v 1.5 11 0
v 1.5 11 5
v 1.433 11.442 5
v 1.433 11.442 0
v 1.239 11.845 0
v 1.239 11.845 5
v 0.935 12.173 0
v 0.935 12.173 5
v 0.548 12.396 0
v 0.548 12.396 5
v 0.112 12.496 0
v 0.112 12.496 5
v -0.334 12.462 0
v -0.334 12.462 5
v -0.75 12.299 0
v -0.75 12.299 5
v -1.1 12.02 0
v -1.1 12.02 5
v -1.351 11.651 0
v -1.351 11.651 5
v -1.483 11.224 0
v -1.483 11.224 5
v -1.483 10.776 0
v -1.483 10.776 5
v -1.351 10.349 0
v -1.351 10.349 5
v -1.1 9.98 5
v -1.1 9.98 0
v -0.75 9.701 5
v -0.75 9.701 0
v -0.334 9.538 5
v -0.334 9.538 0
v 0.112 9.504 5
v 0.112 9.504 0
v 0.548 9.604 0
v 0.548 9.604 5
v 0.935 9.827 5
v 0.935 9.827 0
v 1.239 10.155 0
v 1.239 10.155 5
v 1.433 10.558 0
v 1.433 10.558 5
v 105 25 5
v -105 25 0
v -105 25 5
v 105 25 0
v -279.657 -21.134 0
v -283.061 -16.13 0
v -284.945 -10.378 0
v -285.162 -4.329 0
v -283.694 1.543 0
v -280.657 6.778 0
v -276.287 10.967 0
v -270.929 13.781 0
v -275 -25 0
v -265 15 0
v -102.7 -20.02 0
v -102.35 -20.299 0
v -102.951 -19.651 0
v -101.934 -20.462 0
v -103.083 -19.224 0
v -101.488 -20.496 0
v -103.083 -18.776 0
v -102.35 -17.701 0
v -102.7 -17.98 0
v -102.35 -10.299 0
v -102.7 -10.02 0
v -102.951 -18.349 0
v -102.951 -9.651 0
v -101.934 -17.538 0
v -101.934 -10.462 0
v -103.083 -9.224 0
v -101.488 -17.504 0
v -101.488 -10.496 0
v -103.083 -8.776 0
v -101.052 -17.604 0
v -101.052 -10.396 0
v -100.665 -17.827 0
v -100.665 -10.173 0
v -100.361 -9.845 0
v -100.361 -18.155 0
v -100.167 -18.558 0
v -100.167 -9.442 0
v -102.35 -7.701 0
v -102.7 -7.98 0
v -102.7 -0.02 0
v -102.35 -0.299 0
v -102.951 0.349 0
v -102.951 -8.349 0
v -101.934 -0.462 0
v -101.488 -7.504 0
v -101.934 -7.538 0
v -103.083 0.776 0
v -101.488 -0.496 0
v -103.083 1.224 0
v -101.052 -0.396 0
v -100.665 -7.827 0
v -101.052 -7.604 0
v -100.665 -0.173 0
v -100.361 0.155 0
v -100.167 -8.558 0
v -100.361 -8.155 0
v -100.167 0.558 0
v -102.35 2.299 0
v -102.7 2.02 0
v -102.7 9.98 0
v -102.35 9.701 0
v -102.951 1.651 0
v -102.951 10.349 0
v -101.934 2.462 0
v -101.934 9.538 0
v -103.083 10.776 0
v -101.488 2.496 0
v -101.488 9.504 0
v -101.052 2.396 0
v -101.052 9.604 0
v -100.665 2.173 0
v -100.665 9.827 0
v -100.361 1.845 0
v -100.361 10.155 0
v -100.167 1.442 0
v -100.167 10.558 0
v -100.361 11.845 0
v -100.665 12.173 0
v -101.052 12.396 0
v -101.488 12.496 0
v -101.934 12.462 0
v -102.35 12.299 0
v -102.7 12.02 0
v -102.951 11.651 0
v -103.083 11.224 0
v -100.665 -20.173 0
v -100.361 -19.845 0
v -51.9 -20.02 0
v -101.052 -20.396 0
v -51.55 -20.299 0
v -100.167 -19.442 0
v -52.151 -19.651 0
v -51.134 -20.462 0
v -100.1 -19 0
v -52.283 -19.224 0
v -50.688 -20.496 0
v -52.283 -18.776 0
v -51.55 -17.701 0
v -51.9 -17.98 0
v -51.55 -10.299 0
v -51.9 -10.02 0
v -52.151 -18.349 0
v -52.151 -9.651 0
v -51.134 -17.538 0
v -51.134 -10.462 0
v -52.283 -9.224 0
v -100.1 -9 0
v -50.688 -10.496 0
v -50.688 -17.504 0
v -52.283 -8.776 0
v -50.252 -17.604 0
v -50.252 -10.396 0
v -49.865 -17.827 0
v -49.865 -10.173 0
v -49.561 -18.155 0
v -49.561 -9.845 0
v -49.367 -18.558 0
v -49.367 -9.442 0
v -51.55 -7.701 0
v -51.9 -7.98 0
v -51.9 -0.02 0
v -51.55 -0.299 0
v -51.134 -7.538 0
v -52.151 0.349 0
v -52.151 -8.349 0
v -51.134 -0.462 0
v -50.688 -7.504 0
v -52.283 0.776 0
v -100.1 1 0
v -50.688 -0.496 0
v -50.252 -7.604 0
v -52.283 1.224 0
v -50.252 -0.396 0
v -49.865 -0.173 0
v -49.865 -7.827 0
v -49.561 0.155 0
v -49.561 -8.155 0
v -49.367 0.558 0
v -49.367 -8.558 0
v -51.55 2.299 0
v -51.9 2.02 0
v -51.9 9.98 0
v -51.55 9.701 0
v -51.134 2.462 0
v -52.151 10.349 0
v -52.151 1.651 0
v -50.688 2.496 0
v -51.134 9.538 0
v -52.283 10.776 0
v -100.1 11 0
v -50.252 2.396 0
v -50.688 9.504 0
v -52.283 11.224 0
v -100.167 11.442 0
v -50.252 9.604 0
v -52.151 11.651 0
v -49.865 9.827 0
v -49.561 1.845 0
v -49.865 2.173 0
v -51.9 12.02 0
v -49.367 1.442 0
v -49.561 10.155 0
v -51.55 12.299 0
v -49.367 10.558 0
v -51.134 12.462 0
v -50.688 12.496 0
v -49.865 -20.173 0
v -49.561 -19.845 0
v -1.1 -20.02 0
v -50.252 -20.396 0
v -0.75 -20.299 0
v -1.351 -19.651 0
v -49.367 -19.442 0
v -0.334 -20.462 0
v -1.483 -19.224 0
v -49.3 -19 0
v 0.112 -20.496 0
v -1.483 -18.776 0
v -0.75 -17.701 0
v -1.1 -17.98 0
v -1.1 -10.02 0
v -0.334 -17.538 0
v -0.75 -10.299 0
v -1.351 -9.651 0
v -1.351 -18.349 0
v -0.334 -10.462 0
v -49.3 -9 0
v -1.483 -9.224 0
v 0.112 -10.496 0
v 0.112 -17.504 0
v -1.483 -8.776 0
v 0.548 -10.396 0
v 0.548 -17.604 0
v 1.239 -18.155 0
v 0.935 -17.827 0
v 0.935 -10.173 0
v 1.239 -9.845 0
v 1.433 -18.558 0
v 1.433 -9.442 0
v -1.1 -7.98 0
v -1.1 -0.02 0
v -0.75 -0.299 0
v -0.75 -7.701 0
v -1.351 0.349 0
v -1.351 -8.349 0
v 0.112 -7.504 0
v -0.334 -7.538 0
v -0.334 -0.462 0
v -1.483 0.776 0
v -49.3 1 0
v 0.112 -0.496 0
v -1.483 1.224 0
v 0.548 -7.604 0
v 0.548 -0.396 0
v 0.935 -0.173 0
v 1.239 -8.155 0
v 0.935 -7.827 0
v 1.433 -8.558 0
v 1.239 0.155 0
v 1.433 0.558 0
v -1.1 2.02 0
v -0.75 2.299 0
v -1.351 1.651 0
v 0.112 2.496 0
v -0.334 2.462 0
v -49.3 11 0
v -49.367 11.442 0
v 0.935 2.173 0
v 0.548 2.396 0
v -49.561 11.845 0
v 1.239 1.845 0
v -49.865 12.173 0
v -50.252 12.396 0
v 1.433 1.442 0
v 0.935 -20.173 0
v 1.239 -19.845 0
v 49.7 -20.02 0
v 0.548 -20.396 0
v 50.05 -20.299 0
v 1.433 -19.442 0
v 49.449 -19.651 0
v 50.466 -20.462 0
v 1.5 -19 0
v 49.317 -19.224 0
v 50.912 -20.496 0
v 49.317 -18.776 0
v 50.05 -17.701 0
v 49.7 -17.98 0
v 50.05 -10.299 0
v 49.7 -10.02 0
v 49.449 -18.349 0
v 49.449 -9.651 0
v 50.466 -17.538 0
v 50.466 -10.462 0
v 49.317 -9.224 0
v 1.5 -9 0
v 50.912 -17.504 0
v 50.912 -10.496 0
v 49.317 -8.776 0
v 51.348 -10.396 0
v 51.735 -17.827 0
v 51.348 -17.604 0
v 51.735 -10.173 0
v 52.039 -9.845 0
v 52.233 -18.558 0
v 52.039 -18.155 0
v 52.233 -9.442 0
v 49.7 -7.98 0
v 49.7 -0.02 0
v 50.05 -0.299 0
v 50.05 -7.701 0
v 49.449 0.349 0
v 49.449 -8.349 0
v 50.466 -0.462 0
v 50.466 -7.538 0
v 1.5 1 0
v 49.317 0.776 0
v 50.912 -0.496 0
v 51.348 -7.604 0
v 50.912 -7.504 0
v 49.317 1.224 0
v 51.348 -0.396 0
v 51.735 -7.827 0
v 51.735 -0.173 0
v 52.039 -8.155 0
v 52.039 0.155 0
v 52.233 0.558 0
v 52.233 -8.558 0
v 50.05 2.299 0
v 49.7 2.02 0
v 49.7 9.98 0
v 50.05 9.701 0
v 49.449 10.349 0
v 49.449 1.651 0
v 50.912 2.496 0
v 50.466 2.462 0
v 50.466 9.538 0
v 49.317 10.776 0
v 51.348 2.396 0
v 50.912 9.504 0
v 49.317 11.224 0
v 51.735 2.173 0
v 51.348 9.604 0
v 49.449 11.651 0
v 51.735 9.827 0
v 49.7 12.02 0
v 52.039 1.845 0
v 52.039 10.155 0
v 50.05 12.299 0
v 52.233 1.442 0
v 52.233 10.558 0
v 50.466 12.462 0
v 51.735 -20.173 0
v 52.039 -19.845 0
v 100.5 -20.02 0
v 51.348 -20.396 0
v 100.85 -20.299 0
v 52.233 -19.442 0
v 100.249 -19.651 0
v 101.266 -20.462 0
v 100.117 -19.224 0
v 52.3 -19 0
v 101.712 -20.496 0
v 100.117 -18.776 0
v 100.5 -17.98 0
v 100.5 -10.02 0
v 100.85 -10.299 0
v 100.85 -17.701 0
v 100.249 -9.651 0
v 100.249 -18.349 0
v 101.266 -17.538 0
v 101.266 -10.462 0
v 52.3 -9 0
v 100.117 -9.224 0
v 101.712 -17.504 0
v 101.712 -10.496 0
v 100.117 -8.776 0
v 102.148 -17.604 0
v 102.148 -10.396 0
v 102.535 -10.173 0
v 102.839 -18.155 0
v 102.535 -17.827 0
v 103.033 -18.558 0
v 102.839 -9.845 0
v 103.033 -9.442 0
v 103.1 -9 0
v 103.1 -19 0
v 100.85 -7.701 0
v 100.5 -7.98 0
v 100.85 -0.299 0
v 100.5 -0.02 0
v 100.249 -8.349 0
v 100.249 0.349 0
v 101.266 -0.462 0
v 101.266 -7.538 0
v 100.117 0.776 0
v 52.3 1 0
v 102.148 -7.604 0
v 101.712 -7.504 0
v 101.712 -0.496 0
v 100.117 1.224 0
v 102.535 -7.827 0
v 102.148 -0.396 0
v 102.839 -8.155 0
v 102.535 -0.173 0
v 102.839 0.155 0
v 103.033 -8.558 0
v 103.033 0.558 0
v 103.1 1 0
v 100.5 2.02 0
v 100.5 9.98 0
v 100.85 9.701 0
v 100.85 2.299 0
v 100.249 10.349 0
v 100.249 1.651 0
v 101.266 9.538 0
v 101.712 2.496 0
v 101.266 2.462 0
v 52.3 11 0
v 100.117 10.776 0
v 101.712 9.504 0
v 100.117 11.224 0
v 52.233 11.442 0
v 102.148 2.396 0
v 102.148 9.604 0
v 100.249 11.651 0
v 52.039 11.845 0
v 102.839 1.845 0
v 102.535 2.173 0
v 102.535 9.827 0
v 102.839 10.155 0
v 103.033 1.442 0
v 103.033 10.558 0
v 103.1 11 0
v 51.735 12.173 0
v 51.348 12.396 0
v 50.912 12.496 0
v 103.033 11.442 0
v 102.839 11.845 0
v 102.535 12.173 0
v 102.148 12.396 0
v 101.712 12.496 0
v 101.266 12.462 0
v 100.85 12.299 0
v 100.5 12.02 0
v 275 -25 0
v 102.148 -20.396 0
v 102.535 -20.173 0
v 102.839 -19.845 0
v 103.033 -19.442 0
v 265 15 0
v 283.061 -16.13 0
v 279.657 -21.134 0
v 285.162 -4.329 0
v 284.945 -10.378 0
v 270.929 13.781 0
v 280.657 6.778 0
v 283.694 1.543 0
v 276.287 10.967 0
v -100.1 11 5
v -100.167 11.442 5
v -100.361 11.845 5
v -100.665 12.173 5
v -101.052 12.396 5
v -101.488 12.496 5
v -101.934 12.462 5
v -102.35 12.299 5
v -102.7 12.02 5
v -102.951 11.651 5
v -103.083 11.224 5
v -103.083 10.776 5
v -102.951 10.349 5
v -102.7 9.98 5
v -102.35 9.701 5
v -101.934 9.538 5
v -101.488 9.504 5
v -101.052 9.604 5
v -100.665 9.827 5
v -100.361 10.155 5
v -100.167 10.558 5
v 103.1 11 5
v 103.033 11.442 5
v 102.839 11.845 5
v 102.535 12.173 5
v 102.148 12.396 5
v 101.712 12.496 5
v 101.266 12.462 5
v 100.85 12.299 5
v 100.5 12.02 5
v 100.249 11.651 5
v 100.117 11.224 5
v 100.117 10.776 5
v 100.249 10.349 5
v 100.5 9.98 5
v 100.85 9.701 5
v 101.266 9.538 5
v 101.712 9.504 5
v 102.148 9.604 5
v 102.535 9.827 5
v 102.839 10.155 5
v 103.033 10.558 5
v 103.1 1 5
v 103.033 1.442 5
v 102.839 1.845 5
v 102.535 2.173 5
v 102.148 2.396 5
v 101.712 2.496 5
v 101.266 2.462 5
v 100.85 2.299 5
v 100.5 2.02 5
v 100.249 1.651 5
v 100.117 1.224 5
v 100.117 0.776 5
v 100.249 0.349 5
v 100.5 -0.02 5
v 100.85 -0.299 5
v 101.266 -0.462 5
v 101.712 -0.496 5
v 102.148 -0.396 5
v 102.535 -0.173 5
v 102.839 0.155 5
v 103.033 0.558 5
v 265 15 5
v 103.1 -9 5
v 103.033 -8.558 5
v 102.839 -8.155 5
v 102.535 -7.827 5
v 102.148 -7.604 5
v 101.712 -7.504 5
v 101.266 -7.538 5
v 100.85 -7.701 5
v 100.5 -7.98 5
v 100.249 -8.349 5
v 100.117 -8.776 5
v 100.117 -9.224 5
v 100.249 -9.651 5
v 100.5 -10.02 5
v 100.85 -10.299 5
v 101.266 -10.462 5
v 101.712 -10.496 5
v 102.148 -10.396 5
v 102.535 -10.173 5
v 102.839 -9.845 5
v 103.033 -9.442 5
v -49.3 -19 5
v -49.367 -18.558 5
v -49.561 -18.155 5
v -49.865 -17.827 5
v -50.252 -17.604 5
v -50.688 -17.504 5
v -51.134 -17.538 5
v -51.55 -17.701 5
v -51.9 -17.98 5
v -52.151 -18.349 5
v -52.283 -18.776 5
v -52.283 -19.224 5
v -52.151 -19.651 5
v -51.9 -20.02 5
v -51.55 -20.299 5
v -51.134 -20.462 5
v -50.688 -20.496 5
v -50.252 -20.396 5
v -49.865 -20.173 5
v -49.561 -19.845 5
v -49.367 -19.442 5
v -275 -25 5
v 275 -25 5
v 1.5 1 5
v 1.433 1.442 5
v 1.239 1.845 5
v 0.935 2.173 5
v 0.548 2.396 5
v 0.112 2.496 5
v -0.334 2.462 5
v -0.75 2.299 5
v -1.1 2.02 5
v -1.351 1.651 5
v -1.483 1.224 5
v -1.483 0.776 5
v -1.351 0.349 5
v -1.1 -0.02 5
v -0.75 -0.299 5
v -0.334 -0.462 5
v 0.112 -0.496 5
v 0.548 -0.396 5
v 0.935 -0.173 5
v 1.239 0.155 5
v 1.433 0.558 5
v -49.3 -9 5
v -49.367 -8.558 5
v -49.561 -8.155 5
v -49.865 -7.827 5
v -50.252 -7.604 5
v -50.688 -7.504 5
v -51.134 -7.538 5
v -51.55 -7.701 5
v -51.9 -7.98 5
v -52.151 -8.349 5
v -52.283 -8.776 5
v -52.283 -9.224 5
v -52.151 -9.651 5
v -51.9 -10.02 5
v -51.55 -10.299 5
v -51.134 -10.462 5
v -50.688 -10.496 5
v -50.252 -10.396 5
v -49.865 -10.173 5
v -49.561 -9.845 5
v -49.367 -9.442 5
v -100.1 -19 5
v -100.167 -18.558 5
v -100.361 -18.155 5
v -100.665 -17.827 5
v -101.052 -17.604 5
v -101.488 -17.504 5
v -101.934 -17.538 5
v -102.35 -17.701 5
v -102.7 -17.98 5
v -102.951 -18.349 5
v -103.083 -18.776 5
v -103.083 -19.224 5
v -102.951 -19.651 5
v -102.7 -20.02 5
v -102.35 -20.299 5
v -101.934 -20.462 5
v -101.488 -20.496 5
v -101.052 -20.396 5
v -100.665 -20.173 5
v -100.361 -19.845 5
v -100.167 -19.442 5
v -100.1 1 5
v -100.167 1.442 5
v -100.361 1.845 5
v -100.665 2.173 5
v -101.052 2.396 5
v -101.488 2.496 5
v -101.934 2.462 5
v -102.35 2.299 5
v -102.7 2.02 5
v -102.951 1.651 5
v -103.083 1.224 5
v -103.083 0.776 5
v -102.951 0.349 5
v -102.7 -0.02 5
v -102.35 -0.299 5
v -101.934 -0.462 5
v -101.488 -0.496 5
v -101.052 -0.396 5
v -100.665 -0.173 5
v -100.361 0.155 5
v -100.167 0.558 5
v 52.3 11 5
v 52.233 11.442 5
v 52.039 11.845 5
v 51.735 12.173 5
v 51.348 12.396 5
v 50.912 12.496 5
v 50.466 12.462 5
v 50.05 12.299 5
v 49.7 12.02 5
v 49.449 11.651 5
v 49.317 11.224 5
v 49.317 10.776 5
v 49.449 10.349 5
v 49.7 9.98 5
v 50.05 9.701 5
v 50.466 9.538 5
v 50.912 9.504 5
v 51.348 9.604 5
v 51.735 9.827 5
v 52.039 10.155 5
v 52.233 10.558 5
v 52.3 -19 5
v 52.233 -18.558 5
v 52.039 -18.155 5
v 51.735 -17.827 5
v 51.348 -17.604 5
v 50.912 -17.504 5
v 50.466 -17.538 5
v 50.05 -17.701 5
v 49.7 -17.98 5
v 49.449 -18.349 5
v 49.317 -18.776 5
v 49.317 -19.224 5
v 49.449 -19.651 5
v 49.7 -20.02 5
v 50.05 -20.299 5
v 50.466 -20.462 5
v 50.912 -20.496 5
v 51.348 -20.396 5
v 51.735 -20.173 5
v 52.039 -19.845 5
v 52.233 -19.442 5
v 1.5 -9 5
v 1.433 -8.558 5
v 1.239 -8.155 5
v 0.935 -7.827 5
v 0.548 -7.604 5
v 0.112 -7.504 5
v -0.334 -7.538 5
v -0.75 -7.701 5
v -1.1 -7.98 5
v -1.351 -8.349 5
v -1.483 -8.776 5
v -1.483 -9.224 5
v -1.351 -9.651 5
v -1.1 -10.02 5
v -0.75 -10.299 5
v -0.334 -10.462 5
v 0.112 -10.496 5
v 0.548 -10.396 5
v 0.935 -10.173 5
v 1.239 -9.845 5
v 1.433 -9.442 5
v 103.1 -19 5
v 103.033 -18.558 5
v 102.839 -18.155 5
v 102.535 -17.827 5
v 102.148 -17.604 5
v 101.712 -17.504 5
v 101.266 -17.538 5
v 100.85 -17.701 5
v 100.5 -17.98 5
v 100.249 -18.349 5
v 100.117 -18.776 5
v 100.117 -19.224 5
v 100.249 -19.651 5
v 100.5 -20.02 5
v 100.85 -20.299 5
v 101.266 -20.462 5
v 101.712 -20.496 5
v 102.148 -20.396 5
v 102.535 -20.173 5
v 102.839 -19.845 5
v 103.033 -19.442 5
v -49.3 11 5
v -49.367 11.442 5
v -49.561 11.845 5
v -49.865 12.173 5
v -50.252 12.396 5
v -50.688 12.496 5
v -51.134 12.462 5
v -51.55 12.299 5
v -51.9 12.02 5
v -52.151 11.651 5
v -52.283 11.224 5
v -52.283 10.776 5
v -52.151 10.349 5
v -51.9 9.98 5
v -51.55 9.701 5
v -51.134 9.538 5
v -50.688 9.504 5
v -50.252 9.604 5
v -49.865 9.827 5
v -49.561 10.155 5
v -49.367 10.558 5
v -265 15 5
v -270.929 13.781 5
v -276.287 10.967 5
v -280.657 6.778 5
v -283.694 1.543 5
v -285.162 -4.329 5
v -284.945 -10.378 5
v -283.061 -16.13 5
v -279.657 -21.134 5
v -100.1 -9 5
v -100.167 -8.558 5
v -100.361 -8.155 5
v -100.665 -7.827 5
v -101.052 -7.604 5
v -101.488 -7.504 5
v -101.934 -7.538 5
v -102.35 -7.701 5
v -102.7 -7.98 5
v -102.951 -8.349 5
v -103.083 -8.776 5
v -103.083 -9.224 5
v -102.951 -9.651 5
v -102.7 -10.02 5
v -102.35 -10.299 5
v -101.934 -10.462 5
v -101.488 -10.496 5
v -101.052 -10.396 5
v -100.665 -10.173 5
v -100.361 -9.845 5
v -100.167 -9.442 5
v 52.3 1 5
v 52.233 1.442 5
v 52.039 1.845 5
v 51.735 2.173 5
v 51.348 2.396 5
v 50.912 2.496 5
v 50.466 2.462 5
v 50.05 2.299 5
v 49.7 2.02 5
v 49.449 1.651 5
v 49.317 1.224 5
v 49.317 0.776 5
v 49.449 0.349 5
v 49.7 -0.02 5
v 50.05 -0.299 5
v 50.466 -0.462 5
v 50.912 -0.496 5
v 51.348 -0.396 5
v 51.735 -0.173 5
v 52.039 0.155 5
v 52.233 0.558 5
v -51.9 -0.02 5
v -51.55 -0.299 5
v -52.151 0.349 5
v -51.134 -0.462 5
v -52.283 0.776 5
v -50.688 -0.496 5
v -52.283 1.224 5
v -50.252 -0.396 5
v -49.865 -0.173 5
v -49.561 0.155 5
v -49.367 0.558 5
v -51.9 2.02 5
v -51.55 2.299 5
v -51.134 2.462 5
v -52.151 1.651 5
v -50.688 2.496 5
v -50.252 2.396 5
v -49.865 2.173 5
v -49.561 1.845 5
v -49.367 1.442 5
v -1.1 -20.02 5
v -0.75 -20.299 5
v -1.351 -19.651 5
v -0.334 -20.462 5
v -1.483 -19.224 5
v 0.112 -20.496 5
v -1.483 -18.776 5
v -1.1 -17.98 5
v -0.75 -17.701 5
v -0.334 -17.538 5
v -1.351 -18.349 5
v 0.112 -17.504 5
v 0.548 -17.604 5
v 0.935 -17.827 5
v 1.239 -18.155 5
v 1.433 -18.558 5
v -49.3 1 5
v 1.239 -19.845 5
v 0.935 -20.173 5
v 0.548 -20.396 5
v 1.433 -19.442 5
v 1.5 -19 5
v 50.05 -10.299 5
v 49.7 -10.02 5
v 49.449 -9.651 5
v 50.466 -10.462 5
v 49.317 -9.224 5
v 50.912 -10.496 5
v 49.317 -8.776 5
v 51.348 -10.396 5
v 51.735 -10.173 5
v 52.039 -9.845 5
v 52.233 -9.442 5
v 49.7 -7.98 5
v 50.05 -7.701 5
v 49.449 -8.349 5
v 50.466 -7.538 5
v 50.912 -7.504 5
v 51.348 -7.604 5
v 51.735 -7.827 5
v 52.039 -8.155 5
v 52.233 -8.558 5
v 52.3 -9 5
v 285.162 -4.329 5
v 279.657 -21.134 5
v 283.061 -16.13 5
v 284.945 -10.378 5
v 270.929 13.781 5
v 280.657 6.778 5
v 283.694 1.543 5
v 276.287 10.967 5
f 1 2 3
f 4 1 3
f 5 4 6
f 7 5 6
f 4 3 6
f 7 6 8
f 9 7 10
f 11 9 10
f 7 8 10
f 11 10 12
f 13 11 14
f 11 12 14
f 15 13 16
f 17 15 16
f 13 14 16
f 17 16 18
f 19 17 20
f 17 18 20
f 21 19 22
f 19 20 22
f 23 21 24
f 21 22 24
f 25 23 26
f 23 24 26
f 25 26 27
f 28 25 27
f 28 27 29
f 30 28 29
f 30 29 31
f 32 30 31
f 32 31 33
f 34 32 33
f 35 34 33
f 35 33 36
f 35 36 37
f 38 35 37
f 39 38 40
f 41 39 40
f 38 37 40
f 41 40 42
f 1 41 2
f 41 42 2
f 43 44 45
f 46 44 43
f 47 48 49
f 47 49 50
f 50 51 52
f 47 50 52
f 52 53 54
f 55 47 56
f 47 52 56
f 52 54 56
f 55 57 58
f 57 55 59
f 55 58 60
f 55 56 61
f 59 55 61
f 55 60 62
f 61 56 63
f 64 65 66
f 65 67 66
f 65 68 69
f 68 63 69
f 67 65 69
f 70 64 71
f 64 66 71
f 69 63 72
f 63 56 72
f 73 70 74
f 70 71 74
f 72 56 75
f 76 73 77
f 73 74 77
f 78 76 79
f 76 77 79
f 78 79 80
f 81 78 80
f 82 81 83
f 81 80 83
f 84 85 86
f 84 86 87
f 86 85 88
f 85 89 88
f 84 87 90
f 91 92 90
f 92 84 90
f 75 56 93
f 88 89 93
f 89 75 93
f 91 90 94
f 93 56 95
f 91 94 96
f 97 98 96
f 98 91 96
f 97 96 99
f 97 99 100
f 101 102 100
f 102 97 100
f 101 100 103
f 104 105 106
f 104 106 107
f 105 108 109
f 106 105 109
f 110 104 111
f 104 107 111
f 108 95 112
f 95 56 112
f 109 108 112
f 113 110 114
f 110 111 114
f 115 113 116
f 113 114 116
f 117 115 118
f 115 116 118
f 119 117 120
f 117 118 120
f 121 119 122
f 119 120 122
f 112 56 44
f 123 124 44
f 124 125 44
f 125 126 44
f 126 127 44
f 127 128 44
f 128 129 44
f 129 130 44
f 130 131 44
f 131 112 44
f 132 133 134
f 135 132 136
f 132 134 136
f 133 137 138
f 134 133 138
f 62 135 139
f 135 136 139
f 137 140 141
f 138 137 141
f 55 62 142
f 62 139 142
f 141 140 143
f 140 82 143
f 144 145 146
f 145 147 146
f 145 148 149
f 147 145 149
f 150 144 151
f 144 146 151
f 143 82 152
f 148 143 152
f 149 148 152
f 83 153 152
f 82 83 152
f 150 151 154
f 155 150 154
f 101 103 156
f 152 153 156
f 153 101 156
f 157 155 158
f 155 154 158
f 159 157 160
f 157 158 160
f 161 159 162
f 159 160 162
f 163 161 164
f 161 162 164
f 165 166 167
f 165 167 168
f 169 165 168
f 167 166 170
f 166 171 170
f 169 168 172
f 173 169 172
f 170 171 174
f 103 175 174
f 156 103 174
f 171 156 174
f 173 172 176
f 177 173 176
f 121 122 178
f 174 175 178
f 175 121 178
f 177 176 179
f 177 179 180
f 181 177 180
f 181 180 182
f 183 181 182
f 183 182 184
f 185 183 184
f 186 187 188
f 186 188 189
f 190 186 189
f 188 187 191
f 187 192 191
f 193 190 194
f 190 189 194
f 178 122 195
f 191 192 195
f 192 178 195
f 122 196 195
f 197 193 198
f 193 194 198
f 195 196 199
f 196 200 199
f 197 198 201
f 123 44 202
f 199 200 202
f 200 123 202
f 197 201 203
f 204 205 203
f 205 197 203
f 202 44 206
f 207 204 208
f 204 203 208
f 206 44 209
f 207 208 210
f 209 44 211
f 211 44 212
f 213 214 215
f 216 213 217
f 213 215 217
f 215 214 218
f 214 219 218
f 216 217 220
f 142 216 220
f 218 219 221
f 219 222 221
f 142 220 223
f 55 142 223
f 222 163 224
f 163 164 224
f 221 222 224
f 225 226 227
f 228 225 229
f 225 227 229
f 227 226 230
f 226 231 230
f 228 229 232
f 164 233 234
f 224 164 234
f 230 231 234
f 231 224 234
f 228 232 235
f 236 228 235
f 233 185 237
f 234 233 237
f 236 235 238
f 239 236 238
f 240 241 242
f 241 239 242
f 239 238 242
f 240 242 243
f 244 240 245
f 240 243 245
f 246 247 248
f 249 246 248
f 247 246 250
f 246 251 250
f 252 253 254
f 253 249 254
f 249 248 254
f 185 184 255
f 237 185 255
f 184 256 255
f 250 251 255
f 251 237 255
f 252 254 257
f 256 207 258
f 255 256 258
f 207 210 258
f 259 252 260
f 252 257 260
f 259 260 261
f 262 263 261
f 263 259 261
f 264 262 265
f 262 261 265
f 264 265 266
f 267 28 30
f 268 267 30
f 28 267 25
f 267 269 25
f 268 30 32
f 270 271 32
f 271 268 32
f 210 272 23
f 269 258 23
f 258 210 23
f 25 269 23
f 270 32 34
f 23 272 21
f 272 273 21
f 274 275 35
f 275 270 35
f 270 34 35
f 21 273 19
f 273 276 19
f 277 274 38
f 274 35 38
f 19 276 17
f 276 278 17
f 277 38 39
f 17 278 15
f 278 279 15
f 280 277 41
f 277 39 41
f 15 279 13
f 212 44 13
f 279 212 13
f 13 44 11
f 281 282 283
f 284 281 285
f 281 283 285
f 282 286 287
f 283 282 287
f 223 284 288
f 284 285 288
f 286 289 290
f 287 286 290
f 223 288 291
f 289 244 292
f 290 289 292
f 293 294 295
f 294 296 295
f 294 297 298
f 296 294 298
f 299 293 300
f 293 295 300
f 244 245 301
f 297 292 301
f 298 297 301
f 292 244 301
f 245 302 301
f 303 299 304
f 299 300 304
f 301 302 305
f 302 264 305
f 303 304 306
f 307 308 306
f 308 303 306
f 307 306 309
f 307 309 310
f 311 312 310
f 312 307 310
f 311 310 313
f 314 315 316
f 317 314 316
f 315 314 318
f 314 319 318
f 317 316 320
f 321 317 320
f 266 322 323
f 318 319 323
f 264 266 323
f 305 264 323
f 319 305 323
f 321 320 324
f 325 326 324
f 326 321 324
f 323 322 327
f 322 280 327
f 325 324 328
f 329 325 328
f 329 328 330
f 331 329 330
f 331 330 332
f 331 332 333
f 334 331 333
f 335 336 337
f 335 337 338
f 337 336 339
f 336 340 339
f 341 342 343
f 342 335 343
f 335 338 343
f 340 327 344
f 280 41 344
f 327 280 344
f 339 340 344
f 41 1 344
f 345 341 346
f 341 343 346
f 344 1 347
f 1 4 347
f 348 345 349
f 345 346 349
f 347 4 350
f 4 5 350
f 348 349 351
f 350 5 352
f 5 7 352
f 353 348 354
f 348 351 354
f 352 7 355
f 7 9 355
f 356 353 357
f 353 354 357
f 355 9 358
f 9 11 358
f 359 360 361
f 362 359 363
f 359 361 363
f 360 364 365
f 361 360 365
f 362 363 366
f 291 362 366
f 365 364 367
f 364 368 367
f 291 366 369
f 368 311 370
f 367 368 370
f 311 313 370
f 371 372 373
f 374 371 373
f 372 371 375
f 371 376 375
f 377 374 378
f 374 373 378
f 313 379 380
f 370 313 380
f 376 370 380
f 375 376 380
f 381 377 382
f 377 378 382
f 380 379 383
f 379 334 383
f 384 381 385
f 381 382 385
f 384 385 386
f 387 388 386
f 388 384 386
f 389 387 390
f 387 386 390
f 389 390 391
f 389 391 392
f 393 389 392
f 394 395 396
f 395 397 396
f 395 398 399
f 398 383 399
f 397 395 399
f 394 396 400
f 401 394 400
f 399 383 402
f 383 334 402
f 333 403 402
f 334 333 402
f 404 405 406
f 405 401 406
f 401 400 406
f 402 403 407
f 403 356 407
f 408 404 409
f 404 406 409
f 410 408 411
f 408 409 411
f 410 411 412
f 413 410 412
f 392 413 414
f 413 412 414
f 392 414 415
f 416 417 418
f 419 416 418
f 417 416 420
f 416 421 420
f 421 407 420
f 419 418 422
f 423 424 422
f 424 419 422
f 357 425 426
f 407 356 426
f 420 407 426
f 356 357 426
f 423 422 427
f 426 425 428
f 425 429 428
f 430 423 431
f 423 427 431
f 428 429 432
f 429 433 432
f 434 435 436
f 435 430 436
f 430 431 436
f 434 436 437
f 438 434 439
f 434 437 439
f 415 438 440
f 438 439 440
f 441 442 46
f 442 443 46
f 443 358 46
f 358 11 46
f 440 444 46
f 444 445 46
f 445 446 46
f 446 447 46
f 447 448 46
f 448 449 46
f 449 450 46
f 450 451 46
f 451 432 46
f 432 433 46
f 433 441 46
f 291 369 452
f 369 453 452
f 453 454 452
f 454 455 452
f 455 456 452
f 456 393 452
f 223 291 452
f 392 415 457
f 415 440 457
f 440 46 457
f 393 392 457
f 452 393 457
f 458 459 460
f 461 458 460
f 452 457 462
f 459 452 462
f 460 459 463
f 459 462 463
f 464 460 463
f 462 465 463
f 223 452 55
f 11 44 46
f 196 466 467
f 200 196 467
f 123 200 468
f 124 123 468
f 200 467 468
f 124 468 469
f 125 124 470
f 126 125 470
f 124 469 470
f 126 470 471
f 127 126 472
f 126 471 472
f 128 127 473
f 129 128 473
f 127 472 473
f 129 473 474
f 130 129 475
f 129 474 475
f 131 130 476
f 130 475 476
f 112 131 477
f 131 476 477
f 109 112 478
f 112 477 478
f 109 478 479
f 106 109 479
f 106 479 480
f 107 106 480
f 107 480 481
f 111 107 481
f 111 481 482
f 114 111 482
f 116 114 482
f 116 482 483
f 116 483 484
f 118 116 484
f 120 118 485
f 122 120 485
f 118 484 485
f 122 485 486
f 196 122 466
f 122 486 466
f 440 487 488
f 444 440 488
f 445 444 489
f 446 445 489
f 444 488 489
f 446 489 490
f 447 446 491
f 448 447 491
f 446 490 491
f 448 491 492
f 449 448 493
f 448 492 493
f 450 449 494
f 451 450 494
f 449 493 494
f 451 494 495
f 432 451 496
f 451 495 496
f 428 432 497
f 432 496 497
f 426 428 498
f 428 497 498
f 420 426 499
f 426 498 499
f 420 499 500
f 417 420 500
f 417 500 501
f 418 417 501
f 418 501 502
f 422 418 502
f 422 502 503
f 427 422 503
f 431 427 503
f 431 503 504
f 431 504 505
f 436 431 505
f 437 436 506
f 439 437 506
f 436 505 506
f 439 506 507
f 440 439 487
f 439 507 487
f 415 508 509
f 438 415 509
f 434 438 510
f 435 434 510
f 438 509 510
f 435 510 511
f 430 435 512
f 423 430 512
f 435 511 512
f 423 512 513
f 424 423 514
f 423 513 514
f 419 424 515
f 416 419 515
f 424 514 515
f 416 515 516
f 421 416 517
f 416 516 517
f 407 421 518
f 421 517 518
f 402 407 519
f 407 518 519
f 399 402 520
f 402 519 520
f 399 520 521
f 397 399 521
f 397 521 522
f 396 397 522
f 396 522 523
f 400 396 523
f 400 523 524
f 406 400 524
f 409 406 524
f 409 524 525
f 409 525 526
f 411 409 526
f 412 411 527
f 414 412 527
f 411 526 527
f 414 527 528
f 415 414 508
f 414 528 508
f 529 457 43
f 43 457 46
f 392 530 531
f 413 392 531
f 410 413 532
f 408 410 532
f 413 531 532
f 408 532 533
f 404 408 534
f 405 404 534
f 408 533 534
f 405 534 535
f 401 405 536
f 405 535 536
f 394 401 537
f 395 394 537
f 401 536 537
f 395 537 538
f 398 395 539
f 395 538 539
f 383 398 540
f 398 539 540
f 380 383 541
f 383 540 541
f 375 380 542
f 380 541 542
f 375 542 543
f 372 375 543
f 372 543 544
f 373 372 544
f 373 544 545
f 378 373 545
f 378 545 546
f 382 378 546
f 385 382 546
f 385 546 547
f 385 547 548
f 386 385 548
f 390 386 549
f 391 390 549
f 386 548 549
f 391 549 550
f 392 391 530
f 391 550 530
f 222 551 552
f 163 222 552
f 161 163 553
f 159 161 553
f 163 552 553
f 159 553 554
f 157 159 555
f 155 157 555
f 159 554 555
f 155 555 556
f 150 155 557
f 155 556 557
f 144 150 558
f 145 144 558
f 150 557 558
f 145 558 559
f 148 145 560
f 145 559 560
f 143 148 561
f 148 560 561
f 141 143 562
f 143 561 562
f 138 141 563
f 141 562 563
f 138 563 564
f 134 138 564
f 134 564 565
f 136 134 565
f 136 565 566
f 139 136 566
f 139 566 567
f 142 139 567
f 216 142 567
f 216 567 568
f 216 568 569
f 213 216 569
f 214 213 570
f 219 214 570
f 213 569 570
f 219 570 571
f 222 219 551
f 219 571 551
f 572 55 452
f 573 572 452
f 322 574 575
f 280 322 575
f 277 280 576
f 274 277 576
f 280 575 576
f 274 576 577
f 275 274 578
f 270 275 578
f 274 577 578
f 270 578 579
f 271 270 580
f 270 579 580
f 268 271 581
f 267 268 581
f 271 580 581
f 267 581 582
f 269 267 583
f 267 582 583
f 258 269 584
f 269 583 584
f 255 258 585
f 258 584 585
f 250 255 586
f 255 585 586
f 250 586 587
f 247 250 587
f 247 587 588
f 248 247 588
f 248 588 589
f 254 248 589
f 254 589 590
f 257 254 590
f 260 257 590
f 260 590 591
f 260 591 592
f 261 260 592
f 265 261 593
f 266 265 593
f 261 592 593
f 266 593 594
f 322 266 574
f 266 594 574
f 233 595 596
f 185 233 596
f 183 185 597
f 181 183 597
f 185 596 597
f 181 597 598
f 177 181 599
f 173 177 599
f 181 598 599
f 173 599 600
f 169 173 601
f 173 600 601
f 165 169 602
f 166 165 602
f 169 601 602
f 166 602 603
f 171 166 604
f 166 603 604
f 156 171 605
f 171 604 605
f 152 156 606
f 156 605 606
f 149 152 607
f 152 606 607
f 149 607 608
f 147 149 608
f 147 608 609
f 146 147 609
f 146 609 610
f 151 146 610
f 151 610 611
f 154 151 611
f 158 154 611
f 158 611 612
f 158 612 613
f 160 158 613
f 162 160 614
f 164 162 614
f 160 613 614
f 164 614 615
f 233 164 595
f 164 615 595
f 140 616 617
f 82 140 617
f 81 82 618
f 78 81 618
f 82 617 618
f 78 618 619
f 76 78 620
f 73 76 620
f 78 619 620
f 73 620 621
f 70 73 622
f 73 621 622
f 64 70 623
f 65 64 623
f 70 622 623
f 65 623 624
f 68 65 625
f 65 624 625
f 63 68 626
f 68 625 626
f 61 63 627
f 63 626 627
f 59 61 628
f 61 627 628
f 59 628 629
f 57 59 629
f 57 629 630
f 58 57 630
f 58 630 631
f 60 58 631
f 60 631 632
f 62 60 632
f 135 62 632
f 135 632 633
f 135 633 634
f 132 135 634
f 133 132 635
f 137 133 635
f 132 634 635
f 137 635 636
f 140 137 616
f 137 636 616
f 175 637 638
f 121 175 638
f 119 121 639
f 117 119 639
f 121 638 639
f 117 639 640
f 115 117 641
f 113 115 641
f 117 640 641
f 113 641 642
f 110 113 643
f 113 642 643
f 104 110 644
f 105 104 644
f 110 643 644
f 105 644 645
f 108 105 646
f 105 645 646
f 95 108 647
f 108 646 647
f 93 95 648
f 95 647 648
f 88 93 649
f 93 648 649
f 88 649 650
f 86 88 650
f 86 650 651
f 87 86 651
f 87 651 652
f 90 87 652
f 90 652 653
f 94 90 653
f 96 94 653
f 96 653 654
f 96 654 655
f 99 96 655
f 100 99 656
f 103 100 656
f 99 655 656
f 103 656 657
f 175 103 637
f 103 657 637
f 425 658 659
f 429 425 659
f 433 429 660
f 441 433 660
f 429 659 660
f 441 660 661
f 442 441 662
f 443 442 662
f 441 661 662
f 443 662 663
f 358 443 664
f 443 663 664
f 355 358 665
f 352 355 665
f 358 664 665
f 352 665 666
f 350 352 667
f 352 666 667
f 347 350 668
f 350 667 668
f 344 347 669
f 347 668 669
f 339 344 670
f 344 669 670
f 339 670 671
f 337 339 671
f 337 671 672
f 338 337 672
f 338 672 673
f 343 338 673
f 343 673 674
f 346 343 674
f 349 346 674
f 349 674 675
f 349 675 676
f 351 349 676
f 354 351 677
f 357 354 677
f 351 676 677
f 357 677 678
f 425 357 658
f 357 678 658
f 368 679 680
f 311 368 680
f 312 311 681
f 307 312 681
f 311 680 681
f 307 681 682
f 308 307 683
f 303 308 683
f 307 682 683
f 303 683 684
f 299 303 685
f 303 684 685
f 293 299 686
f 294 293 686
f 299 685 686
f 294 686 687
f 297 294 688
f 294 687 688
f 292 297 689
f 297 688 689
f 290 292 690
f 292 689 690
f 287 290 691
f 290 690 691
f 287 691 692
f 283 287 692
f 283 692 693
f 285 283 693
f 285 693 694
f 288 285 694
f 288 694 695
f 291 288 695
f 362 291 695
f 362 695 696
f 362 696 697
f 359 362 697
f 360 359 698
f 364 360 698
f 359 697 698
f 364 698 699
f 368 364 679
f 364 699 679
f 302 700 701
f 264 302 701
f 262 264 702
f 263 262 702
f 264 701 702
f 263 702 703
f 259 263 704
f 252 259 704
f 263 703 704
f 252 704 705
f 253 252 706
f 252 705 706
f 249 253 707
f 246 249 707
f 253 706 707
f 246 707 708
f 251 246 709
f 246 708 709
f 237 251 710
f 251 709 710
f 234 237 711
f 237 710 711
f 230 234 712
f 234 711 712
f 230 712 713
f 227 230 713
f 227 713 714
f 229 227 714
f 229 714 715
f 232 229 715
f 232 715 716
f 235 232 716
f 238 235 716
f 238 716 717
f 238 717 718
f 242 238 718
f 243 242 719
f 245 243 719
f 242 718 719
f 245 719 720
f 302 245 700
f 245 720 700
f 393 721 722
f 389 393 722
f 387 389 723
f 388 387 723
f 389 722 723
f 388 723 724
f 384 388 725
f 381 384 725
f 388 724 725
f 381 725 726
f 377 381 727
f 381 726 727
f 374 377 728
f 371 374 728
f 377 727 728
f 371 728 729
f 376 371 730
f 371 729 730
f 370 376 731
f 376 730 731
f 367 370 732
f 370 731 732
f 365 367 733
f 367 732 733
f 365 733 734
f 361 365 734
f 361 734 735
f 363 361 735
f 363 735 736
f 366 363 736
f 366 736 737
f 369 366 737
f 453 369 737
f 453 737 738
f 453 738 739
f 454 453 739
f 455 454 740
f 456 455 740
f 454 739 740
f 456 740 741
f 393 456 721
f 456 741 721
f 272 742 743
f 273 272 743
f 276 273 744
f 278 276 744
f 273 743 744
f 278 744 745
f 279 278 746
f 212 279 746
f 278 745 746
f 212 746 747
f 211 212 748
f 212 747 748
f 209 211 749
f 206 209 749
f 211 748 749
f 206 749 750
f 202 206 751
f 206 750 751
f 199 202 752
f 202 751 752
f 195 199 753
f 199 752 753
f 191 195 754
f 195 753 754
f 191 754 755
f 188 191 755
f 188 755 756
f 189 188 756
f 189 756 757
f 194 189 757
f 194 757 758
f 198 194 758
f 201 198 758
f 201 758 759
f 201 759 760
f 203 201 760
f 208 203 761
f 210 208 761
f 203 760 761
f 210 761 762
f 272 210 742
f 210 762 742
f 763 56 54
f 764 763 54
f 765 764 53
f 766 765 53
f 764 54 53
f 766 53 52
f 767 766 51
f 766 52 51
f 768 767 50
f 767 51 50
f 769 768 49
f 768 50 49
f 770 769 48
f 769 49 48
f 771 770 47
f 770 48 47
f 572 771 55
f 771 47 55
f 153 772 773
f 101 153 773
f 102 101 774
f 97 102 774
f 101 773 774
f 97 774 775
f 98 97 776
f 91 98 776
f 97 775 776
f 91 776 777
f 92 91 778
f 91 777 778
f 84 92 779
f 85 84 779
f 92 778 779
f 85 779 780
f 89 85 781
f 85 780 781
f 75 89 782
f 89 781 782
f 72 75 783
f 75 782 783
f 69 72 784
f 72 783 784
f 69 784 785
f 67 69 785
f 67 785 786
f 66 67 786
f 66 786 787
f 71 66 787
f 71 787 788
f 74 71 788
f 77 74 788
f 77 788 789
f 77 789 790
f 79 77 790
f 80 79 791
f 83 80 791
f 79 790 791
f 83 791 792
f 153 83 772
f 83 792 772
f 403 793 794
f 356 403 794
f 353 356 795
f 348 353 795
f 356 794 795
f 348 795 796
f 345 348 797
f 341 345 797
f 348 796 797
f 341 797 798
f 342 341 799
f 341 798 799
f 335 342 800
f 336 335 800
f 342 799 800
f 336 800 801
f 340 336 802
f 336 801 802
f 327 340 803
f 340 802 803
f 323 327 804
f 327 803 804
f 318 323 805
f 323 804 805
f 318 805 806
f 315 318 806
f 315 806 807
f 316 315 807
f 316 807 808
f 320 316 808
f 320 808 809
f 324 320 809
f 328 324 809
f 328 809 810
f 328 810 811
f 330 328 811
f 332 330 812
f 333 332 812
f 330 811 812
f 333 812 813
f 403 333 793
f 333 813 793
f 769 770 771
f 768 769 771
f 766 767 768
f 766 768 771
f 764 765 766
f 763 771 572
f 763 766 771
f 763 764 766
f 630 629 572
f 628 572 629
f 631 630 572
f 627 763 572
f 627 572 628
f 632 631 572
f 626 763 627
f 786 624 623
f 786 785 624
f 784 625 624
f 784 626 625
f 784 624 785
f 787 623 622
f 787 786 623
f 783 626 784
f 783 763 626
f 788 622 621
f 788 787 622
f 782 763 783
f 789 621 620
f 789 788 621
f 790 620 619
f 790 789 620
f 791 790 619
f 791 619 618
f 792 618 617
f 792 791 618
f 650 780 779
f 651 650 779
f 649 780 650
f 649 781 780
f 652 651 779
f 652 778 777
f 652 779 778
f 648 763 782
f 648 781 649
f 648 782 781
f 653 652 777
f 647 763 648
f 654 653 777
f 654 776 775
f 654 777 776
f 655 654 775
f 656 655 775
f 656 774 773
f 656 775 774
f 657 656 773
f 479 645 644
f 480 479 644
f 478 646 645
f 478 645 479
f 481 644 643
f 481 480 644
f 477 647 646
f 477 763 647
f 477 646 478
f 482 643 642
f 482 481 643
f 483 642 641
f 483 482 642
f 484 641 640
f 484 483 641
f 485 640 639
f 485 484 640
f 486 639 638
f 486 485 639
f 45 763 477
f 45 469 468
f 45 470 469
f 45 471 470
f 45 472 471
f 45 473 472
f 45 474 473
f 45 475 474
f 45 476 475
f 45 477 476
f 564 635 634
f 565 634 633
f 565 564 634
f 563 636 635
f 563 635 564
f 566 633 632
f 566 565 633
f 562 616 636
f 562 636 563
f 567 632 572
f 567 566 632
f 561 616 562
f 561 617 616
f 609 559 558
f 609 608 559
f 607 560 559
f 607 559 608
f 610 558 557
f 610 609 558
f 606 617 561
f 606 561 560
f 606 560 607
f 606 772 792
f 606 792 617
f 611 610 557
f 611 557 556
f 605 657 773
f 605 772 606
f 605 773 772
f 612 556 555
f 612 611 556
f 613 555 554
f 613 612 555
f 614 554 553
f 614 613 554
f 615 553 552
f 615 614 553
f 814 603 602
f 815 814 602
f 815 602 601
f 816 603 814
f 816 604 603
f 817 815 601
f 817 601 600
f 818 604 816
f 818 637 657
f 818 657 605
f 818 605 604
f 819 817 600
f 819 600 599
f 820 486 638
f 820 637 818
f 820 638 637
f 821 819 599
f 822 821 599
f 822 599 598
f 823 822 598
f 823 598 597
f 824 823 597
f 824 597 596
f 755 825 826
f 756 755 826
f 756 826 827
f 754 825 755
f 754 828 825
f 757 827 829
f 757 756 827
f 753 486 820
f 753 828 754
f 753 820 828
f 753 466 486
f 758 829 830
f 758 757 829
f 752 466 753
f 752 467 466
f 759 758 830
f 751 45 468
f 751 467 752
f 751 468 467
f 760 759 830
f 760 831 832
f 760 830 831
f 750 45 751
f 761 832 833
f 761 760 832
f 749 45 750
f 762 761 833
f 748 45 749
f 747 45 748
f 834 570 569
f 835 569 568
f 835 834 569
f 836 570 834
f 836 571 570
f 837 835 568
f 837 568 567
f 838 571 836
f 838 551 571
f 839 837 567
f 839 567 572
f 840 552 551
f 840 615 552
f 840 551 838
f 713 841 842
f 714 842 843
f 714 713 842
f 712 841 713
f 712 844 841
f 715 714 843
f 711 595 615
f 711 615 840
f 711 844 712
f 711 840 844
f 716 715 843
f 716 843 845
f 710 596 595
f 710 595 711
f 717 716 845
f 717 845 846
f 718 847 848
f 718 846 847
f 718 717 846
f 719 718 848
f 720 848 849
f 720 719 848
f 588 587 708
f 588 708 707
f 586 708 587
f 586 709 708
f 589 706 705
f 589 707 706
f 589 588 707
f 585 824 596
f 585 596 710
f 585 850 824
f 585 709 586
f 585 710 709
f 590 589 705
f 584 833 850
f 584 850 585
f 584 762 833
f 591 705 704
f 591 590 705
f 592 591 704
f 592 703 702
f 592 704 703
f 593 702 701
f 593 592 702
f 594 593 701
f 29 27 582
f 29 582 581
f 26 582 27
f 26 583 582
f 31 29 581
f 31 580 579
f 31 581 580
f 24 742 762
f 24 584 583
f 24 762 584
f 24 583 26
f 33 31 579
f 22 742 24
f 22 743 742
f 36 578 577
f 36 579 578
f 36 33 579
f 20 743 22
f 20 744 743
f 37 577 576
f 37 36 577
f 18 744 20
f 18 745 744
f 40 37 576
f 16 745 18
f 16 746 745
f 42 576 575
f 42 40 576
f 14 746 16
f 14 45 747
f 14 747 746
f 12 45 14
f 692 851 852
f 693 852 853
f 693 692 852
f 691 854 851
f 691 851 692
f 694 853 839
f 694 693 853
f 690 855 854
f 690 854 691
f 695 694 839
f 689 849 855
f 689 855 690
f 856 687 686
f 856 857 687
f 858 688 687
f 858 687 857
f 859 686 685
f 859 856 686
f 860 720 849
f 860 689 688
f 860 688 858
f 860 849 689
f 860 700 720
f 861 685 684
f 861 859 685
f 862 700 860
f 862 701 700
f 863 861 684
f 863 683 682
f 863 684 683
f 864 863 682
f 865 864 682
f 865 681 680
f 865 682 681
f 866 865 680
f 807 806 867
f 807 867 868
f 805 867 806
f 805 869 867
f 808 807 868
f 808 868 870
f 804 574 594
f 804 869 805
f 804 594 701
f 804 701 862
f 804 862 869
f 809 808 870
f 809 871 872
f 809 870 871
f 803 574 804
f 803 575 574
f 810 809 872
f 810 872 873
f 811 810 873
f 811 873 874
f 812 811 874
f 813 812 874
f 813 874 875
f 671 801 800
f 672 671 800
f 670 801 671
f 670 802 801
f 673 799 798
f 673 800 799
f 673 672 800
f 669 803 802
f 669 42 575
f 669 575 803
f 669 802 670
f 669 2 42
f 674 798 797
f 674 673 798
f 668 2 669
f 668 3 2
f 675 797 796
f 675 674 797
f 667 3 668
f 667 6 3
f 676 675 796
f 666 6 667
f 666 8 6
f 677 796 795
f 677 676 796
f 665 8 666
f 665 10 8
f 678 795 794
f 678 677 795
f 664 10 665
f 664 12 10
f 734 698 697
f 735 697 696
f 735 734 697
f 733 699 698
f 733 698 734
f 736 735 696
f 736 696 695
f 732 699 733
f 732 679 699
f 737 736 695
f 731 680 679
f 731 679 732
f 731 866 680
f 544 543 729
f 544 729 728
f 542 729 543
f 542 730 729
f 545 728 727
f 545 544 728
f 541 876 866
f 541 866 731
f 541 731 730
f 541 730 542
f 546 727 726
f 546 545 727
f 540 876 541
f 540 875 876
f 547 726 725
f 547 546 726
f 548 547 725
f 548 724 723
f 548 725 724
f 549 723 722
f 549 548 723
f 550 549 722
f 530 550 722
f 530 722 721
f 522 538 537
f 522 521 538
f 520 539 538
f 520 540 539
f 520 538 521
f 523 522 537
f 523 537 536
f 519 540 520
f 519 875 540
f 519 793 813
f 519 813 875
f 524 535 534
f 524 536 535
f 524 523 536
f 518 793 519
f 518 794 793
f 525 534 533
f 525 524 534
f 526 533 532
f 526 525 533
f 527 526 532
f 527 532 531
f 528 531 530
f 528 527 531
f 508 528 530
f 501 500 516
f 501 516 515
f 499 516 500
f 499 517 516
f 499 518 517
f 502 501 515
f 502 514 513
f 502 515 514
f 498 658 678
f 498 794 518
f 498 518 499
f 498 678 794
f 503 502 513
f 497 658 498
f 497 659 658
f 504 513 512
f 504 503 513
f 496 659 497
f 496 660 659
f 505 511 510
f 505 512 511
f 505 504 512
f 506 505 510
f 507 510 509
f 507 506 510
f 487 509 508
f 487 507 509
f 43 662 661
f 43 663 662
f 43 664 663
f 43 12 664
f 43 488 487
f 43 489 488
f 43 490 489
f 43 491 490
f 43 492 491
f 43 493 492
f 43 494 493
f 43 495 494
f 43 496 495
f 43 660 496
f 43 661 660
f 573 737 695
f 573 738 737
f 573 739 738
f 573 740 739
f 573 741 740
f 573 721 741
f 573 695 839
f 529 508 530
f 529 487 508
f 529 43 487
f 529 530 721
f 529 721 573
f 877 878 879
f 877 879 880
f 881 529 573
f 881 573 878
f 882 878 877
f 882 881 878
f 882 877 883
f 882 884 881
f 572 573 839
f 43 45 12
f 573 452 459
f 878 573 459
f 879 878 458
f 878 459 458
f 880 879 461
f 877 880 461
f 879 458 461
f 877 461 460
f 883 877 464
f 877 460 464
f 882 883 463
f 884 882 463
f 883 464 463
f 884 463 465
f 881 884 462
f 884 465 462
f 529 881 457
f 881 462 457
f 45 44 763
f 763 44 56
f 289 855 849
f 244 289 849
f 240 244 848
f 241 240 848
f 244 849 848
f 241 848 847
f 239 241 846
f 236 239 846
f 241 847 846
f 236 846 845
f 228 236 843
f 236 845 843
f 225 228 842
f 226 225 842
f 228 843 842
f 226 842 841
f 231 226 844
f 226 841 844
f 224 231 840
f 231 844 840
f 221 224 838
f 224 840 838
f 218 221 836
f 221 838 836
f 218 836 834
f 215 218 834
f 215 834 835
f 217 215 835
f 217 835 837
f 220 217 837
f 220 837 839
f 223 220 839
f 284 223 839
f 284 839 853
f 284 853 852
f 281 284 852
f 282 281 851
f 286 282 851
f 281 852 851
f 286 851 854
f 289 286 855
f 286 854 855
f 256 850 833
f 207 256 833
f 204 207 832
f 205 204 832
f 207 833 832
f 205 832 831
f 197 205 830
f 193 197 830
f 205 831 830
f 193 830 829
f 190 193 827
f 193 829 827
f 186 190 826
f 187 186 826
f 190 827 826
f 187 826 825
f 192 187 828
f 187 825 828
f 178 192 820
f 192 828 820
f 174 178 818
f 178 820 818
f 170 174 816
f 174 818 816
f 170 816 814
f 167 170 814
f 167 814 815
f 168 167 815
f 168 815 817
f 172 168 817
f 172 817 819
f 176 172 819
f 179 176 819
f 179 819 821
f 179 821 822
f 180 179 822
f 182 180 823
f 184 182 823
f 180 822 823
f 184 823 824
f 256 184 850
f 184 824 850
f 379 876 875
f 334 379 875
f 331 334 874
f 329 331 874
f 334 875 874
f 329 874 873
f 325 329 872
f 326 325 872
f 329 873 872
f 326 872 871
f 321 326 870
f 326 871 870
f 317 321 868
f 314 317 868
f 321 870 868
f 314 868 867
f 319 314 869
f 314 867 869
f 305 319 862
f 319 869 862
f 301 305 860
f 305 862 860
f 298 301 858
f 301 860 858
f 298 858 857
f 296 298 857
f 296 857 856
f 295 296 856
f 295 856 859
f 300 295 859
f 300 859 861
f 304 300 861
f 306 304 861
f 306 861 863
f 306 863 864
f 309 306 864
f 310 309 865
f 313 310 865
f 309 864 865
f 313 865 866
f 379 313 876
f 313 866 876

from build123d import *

# Parameters (mm, degrees)
SKETCH3_W           = 210
SKETCH3_H           = 50
BOSS_EXTRUDE1_DEPTH = 5
SKETCH8_R           = 1.5
CUT_EXTRUDE1_DEPTH  = 5


with BuildPart() as part:
    # Sketch3 → Boss-Extrude1 (new body)
    with BuildSketch(Plane.XY):
        Polygon((-265, -25), (-105, -25), (-105, 25), (-265, 15), align=None)
        with BuildLine():
            Line((-275, -25), (-265, -25))
            Line((-265, -25), (-265, 15))
            ThreePointArc((-265, 15), (-284.634416342, -1.341395914), (-275, -25))
        make_face()
        Rectangle(SKETCH3_W, SKETCH3_H)
        Polygon((105, 25), (105, -25), (265, -25), (265, 15), align=None)
        with BuildLine():
            Line((265, 15), (265, -25))
            Line((265, -25), (275, -25))
            ThreePointArc((275, -25), (284.634416342, -1.341395914), (265, 15))
        make_face()
    extrude(amount=BOSS_EXTRUDE1_DEPTH)

    # Sketch8 → Cut-Extrude1 (cut)
    with BuildSketch(Plane.XY.offset(5)):
        with Locations((0, 11)):
            Circle(SKETCH8_R)
        with Locations((0, 1)):
            Circle(SKETCH8_R)
        with Locations((0, -9)):
            Circle(SKETCH8_R)
        with Locations((0, -19)):
            Circle(SKETCH8_R)
        with Locations((50.8, 11)):
            Circle(SKETCH8_R)
        with Locations((50.8, -9)):
            Circle(SKETCH8_R)
        with Locations((50.8, 1)):
            Circle(SKETCH8_R)
        with Locations((50.8, -19)):
            Circle(SKETCH8_R)
        with Locations((101.6, 11)):
            Circle(SKETCH8_R)
        with Locations((101.6, -9)):
            Circle(SKETCH8_R)
        with Locations((101.6, 1)):
            Circle(SKETCH8_R)
        with Locations((101.6, -19)):
            Circle(SKETCH8_R)
        with Locations((-50.8, 11)):
            Circle(SKETCH8_R)
        with Locations((-50.8, 1)):
            Circle(SKETCH8_R)
        with Locations((-50.8, -9)):
            Circle(SKETCH8_R)
        with Locations((-50.8, -19)):
            Circle(SKETCH8_R)
        with Locations((-101.6, 11)):
            Circle(SKETCH8_R)
        with Locations((-101.6, 1)):
            Circle(SKETCH8_R)
        with Locations((-101.6, -9)):
            Circle(SKETCH8_R)
        with Locations((-101.6, -19)):
            Circle(SKETCH8_R)
    extrude(amount=-CUT_EXTRUDE1_DEPTH, mode=Mode.SUBTRACT)


solid = part.part
